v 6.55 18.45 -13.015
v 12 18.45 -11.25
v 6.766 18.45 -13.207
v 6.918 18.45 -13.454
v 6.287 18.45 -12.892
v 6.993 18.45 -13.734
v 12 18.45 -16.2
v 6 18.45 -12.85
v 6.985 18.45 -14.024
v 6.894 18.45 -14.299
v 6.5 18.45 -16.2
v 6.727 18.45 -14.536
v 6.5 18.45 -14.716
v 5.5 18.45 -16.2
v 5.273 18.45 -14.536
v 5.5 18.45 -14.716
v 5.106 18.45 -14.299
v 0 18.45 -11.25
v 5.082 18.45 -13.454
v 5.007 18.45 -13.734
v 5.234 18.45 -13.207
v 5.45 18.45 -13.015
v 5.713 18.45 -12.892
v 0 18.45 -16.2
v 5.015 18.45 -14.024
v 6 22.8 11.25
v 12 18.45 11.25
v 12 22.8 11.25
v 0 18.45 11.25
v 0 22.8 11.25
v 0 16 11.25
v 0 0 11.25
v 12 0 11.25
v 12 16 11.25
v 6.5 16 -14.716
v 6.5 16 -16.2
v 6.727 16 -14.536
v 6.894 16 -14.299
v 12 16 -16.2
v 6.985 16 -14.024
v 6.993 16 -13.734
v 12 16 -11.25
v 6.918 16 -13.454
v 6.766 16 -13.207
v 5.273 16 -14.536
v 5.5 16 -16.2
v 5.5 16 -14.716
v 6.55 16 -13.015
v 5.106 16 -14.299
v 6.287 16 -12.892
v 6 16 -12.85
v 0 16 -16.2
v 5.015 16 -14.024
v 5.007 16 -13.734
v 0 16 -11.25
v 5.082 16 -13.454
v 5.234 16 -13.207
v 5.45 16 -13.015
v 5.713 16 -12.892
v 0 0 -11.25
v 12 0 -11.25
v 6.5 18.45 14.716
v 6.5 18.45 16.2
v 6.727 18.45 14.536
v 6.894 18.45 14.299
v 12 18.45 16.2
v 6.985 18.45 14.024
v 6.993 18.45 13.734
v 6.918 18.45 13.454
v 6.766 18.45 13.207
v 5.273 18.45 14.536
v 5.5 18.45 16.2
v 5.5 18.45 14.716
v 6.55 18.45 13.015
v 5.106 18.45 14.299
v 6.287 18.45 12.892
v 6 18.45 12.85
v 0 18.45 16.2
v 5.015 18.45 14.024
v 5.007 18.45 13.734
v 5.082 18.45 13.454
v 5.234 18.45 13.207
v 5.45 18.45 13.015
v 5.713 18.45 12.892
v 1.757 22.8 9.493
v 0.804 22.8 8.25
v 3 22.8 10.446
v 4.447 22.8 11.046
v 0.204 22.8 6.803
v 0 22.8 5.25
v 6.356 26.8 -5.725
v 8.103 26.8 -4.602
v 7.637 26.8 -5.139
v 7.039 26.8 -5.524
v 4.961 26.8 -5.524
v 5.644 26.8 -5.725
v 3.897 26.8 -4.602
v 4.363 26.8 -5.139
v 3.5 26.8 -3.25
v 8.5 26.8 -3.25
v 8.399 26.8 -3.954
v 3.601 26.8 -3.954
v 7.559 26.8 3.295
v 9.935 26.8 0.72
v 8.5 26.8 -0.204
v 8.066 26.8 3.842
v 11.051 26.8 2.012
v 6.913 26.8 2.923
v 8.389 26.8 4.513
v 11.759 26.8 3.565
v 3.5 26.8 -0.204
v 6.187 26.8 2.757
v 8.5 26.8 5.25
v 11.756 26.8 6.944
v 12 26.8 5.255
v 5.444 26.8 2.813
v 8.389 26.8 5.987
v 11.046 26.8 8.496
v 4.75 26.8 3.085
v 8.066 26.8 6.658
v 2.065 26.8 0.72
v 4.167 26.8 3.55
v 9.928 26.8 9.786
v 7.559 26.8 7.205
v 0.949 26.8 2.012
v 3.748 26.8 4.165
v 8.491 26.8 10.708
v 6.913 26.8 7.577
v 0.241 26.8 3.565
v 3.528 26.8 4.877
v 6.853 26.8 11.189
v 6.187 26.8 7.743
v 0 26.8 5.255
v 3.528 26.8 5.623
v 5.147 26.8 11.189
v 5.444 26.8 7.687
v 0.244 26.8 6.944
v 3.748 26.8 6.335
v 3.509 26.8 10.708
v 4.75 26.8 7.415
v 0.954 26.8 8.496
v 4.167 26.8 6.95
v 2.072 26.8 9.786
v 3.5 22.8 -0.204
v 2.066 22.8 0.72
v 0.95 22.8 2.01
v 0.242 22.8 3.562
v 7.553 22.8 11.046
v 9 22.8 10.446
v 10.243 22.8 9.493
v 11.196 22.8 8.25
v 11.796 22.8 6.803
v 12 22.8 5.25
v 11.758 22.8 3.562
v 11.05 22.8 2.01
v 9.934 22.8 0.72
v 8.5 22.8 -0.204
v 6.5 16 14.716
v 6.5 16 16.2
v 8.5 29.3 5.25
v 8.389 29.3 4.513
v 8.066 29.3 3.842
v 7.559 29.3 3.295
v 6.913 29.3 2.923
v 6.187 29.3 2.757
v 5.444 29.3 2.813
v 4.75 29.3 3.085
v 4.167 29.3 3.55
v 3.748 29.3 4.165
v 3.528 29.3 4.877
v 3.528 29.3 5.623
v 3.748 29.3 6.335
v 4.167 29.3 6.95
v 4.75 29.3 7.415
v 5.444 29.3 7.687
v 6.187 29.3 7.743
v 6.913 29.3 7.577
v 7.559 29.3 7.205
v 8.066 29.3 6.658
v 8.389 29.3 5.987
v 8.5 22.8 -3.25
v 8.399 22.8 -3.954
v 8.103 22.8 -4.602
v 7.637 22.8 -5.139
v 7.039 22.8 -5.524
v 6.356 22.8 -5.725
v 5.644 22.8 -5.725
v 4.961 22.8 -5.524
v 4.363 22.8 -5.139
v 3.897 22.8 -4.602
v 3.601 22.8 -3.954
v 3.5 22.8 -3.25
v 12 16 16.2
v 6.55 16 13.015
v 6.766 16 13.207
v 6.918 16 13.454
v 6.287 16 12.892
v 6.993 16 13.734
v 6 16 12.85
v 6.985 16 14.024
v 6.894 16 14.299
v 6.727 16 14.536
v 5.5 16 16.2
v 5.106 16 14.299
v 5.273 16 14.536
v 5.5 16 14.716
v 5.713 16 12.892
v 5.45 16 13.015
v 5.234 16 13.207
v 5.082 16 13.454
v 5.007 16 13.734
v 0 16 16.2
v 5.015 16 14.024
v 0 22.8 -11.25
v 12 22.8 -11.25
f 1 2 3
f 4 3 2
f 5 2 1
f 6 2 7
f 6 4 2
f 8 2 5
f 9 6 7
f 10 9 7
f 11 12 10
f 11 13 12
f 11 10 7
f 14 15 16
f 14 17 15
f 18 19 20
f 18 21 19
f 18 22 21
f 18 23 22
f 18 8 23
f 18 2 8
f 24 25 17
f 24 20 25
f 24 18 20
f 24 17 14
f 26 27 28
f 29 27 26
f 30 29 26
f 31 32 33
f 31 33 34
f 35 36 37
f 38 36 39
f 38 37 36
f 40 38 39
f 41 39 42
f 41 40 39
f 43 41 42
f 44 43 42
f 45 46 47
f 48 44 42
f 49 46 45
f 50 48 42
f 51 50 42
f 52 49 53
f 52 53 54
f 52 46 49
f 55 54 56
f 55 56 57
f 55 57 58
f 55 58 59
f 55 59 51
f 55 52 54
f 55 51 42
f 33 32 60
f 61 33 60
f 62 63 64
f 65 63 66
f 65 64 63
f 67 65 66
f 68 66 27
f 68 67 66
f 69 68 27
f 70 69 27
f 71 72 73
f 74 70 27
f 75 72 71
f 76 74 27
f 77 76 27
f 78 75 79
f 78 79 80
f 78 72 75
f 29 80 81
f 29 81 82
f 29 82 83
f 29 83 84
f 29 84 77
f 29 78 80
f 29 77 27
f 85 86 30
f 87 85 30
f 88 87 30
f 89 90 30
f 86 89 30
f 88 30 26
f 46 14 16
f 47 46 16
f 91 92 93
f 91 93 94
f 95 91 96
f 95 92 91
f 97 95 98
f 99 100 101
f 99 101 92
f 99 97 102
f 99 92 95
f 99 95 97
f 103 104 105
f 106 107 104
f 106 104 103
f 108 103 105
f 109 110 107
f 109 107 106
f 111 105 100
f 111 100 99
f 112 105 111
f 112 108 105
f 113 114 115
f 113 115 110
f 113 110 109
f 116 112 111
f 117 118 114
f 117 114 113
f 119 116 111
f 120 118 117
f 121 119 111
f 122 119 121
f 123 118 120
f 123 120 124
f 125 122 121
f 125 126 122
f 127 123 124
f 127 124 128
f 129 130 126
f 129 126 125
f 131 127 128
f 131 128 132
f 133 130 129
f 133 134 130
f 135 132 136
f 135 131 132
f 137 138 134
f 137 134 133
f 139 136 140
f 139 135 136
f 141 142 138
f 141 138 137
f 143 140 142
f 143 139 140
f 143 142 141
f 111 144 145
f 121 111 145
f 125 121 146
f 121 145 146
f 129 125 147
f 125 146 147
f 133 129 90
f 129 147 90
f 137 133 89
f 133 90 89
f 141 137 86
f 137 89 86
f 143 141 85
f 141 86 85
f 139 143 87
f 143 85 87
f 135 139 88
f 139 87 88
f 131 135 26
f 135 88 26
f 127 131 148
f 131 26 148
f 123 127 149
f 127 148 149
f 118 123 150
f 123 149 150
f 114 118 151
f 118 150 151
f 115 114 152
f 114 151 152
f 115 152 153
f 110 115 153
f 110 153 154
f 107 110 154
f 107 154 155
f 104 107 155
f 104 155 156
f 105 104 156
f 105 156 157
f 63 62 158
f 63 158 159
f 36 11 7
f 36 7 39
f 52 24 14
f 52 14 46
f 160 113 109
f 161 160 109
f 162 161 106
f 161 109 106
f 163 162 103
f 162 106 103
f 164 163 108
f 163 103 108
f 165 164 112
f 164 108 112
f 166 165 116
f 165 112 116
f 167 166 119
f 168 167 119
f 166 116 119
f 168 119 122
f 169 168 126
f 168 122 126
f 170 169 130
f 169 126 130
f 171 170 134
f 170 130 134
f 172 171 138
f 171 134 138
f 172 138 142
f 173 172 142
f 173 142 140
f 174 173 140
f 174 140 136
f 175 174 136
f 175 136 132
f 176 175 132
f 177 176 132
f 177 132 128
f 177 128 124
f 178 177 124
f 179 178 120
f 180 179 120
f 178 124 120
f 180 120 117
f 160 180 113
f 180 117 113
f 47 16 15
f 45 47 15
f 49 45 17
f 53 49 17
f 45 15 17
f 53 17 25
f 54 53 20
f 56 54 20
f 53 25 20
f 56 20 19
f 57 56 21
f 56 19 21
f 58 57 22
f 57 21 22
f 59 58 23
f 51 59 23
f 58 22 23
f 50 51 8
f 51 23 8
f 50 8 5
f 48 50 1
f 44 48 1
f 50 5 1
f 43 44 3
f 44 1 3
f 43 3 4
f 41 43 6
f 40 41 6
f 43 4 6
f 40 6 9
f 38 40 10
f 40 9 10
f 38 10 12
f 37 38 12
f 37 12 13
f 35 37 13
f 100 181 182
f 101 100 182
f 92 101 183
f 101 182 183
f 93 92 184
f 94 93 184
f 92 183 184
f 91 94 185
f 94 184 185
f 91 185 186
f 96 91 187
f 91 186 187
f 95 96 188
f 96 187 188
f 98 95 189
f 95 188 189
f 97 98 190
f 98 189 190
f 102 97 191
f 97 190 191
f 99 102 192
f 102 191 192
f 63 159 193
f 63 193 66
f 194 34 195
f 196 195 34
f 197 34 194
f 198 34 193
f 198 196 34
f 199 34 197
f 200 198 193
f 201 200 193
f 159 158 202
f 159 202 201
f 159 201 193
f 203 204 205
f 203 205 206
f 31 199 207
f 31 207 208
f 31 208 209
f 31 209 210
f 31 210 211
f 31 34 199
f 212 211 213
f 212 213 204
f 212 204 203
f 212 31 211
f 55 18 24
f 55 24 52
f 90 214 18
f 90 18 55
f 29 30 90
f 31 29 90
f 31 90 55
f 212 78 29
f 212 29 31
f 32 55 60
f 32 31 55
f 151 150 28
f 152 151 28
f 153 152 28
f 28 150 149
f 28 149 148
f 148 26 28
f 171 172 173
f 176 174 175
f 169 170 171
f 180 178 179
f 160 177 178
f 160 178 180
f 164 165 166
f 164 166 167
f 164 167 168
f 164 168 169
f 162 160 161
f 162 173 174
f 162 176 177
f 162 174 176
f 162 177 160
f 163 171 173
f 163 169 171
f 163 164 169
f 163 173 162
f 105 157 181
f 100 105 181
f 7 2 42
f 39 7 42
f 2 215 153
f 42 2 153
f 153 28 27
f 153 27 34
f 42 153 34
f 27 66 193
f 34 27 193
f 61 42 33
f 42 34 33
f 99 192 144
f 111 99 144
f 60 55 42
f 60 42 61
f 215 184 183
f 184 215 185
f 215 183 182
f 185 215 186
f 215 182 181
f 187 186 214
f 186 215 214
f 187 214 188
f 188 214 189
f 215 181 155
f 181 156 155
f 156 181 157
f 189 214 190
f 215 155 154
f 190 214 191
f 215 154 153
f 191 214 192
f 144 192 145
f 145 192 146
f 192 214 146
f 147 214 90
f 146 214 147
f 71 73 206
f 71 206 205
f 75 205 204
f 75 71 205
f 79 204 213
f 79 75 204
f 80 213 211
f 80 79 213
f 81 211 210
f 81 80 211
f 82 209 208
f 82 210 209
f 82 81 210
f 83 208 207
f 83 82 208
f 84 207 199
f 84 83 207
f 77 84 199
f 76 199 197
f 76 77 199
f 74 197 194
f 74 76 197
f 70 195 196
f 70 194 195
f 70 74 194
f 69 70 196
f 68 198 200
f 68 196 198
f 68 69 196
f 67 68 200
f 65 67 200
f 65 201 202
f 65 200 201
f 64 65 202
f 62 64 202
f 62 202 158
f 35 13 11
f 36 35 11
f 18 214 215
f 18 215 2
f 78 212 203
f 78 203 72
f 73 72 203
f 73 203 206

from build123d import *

# Parameters (mm, degrees)
EXTRUSION1_DEPTH = 12
EXTRUSION2_DEPTH = 12.6
EXTRUSION3_DEPTH = 4
SKETCH4_R        = 2.5
EXTRUSION4_DEPTH = 2.5


with BuildPart() as part:
    # Sketch1 → Extrusion1 (new body)
    with BuildSketch(Plane.YZ):
        Polygon((0, 0), (0, 11.25), (16, 11.25), (16, 16.2), (18.45, 16.2), (18.45, 11.25), (22.8, 11.25), (22.8, 0), (22.8, -11.25), (18.45, -11.25), (18.45, -16.2), (16, -16.2), (16, -11.25), (0, -11.25), align=None)
    extrude(amount=EXTRUSION1_DEPTH)

    # Sketch2 → Extrusion2 (cut)
    with BuildSketch(Plane(origin=(0, 18.45, 0), x_dir=(-1, 0, 0), z_dir=(0, 1, 0))):
        with BuildLine():
            Line((-6.5, -14.716025404), (-6.5, -16.2))
            Line((-6.5, -16.2), (-5.5, -16.2))
            Line((-5.5, -16.2), (-5.5, -14.716025404))
            ThreePointArc((-5.5, -14.716025404), (-6, -12.85), (-6.5, -14.716025404))
        make_face()
        with BuildLine():
            Line((-6.5, 14.716025404), (-6.5, 16.2))
            Line((-6.5, 16.2), (-5.5, 16.2))
            Line((-5.5, 16.2), (-5.5, 14.716025404))
            ThreePointArc((-5.5, 14.716025404), (-6, 12.85), (-6.5, 14.716025404))
        make_face()
    extrude(amount=-EXTRUSION2_DEPTH, mode=Mode.SUBTRACT)

    # Sketch3 → Extrusion3 (add)
    with BuildSketch(Plane(origin=(0, 22.8, 0), x_dir=(-1, 0, 0), z_dir=(0, 1, 0))):
        with BuildLine():
            Line((-8.5, -0.204356057), (-8.5, -3.25))
            ThreePointArc((-8.5, -3.25), (-6, -5.75), (-3.5, -3.25))
            Line((-3.5, -3.25), (-3.5, -0.204356057))
            ThreePointArc((-3.5, -0.204356057), (-6, 11.25), (-8.5, -0.204356057))
        make_face()
    extrude(amount=EXTRUSION3_DEPTH)

    # Sketch4 → Extrusion4 (add)
    with BuildSketch(Plane(origin=(0, 26.8, 11.25), x_dir=(1, 0, 0), z_dir=(0, 1, 0))):
        with Locations((6, 6)):
            Circle(SKETCH4_R)
    extrude(amount=EXTRUSION4_DEPTH)


solid = part.part
